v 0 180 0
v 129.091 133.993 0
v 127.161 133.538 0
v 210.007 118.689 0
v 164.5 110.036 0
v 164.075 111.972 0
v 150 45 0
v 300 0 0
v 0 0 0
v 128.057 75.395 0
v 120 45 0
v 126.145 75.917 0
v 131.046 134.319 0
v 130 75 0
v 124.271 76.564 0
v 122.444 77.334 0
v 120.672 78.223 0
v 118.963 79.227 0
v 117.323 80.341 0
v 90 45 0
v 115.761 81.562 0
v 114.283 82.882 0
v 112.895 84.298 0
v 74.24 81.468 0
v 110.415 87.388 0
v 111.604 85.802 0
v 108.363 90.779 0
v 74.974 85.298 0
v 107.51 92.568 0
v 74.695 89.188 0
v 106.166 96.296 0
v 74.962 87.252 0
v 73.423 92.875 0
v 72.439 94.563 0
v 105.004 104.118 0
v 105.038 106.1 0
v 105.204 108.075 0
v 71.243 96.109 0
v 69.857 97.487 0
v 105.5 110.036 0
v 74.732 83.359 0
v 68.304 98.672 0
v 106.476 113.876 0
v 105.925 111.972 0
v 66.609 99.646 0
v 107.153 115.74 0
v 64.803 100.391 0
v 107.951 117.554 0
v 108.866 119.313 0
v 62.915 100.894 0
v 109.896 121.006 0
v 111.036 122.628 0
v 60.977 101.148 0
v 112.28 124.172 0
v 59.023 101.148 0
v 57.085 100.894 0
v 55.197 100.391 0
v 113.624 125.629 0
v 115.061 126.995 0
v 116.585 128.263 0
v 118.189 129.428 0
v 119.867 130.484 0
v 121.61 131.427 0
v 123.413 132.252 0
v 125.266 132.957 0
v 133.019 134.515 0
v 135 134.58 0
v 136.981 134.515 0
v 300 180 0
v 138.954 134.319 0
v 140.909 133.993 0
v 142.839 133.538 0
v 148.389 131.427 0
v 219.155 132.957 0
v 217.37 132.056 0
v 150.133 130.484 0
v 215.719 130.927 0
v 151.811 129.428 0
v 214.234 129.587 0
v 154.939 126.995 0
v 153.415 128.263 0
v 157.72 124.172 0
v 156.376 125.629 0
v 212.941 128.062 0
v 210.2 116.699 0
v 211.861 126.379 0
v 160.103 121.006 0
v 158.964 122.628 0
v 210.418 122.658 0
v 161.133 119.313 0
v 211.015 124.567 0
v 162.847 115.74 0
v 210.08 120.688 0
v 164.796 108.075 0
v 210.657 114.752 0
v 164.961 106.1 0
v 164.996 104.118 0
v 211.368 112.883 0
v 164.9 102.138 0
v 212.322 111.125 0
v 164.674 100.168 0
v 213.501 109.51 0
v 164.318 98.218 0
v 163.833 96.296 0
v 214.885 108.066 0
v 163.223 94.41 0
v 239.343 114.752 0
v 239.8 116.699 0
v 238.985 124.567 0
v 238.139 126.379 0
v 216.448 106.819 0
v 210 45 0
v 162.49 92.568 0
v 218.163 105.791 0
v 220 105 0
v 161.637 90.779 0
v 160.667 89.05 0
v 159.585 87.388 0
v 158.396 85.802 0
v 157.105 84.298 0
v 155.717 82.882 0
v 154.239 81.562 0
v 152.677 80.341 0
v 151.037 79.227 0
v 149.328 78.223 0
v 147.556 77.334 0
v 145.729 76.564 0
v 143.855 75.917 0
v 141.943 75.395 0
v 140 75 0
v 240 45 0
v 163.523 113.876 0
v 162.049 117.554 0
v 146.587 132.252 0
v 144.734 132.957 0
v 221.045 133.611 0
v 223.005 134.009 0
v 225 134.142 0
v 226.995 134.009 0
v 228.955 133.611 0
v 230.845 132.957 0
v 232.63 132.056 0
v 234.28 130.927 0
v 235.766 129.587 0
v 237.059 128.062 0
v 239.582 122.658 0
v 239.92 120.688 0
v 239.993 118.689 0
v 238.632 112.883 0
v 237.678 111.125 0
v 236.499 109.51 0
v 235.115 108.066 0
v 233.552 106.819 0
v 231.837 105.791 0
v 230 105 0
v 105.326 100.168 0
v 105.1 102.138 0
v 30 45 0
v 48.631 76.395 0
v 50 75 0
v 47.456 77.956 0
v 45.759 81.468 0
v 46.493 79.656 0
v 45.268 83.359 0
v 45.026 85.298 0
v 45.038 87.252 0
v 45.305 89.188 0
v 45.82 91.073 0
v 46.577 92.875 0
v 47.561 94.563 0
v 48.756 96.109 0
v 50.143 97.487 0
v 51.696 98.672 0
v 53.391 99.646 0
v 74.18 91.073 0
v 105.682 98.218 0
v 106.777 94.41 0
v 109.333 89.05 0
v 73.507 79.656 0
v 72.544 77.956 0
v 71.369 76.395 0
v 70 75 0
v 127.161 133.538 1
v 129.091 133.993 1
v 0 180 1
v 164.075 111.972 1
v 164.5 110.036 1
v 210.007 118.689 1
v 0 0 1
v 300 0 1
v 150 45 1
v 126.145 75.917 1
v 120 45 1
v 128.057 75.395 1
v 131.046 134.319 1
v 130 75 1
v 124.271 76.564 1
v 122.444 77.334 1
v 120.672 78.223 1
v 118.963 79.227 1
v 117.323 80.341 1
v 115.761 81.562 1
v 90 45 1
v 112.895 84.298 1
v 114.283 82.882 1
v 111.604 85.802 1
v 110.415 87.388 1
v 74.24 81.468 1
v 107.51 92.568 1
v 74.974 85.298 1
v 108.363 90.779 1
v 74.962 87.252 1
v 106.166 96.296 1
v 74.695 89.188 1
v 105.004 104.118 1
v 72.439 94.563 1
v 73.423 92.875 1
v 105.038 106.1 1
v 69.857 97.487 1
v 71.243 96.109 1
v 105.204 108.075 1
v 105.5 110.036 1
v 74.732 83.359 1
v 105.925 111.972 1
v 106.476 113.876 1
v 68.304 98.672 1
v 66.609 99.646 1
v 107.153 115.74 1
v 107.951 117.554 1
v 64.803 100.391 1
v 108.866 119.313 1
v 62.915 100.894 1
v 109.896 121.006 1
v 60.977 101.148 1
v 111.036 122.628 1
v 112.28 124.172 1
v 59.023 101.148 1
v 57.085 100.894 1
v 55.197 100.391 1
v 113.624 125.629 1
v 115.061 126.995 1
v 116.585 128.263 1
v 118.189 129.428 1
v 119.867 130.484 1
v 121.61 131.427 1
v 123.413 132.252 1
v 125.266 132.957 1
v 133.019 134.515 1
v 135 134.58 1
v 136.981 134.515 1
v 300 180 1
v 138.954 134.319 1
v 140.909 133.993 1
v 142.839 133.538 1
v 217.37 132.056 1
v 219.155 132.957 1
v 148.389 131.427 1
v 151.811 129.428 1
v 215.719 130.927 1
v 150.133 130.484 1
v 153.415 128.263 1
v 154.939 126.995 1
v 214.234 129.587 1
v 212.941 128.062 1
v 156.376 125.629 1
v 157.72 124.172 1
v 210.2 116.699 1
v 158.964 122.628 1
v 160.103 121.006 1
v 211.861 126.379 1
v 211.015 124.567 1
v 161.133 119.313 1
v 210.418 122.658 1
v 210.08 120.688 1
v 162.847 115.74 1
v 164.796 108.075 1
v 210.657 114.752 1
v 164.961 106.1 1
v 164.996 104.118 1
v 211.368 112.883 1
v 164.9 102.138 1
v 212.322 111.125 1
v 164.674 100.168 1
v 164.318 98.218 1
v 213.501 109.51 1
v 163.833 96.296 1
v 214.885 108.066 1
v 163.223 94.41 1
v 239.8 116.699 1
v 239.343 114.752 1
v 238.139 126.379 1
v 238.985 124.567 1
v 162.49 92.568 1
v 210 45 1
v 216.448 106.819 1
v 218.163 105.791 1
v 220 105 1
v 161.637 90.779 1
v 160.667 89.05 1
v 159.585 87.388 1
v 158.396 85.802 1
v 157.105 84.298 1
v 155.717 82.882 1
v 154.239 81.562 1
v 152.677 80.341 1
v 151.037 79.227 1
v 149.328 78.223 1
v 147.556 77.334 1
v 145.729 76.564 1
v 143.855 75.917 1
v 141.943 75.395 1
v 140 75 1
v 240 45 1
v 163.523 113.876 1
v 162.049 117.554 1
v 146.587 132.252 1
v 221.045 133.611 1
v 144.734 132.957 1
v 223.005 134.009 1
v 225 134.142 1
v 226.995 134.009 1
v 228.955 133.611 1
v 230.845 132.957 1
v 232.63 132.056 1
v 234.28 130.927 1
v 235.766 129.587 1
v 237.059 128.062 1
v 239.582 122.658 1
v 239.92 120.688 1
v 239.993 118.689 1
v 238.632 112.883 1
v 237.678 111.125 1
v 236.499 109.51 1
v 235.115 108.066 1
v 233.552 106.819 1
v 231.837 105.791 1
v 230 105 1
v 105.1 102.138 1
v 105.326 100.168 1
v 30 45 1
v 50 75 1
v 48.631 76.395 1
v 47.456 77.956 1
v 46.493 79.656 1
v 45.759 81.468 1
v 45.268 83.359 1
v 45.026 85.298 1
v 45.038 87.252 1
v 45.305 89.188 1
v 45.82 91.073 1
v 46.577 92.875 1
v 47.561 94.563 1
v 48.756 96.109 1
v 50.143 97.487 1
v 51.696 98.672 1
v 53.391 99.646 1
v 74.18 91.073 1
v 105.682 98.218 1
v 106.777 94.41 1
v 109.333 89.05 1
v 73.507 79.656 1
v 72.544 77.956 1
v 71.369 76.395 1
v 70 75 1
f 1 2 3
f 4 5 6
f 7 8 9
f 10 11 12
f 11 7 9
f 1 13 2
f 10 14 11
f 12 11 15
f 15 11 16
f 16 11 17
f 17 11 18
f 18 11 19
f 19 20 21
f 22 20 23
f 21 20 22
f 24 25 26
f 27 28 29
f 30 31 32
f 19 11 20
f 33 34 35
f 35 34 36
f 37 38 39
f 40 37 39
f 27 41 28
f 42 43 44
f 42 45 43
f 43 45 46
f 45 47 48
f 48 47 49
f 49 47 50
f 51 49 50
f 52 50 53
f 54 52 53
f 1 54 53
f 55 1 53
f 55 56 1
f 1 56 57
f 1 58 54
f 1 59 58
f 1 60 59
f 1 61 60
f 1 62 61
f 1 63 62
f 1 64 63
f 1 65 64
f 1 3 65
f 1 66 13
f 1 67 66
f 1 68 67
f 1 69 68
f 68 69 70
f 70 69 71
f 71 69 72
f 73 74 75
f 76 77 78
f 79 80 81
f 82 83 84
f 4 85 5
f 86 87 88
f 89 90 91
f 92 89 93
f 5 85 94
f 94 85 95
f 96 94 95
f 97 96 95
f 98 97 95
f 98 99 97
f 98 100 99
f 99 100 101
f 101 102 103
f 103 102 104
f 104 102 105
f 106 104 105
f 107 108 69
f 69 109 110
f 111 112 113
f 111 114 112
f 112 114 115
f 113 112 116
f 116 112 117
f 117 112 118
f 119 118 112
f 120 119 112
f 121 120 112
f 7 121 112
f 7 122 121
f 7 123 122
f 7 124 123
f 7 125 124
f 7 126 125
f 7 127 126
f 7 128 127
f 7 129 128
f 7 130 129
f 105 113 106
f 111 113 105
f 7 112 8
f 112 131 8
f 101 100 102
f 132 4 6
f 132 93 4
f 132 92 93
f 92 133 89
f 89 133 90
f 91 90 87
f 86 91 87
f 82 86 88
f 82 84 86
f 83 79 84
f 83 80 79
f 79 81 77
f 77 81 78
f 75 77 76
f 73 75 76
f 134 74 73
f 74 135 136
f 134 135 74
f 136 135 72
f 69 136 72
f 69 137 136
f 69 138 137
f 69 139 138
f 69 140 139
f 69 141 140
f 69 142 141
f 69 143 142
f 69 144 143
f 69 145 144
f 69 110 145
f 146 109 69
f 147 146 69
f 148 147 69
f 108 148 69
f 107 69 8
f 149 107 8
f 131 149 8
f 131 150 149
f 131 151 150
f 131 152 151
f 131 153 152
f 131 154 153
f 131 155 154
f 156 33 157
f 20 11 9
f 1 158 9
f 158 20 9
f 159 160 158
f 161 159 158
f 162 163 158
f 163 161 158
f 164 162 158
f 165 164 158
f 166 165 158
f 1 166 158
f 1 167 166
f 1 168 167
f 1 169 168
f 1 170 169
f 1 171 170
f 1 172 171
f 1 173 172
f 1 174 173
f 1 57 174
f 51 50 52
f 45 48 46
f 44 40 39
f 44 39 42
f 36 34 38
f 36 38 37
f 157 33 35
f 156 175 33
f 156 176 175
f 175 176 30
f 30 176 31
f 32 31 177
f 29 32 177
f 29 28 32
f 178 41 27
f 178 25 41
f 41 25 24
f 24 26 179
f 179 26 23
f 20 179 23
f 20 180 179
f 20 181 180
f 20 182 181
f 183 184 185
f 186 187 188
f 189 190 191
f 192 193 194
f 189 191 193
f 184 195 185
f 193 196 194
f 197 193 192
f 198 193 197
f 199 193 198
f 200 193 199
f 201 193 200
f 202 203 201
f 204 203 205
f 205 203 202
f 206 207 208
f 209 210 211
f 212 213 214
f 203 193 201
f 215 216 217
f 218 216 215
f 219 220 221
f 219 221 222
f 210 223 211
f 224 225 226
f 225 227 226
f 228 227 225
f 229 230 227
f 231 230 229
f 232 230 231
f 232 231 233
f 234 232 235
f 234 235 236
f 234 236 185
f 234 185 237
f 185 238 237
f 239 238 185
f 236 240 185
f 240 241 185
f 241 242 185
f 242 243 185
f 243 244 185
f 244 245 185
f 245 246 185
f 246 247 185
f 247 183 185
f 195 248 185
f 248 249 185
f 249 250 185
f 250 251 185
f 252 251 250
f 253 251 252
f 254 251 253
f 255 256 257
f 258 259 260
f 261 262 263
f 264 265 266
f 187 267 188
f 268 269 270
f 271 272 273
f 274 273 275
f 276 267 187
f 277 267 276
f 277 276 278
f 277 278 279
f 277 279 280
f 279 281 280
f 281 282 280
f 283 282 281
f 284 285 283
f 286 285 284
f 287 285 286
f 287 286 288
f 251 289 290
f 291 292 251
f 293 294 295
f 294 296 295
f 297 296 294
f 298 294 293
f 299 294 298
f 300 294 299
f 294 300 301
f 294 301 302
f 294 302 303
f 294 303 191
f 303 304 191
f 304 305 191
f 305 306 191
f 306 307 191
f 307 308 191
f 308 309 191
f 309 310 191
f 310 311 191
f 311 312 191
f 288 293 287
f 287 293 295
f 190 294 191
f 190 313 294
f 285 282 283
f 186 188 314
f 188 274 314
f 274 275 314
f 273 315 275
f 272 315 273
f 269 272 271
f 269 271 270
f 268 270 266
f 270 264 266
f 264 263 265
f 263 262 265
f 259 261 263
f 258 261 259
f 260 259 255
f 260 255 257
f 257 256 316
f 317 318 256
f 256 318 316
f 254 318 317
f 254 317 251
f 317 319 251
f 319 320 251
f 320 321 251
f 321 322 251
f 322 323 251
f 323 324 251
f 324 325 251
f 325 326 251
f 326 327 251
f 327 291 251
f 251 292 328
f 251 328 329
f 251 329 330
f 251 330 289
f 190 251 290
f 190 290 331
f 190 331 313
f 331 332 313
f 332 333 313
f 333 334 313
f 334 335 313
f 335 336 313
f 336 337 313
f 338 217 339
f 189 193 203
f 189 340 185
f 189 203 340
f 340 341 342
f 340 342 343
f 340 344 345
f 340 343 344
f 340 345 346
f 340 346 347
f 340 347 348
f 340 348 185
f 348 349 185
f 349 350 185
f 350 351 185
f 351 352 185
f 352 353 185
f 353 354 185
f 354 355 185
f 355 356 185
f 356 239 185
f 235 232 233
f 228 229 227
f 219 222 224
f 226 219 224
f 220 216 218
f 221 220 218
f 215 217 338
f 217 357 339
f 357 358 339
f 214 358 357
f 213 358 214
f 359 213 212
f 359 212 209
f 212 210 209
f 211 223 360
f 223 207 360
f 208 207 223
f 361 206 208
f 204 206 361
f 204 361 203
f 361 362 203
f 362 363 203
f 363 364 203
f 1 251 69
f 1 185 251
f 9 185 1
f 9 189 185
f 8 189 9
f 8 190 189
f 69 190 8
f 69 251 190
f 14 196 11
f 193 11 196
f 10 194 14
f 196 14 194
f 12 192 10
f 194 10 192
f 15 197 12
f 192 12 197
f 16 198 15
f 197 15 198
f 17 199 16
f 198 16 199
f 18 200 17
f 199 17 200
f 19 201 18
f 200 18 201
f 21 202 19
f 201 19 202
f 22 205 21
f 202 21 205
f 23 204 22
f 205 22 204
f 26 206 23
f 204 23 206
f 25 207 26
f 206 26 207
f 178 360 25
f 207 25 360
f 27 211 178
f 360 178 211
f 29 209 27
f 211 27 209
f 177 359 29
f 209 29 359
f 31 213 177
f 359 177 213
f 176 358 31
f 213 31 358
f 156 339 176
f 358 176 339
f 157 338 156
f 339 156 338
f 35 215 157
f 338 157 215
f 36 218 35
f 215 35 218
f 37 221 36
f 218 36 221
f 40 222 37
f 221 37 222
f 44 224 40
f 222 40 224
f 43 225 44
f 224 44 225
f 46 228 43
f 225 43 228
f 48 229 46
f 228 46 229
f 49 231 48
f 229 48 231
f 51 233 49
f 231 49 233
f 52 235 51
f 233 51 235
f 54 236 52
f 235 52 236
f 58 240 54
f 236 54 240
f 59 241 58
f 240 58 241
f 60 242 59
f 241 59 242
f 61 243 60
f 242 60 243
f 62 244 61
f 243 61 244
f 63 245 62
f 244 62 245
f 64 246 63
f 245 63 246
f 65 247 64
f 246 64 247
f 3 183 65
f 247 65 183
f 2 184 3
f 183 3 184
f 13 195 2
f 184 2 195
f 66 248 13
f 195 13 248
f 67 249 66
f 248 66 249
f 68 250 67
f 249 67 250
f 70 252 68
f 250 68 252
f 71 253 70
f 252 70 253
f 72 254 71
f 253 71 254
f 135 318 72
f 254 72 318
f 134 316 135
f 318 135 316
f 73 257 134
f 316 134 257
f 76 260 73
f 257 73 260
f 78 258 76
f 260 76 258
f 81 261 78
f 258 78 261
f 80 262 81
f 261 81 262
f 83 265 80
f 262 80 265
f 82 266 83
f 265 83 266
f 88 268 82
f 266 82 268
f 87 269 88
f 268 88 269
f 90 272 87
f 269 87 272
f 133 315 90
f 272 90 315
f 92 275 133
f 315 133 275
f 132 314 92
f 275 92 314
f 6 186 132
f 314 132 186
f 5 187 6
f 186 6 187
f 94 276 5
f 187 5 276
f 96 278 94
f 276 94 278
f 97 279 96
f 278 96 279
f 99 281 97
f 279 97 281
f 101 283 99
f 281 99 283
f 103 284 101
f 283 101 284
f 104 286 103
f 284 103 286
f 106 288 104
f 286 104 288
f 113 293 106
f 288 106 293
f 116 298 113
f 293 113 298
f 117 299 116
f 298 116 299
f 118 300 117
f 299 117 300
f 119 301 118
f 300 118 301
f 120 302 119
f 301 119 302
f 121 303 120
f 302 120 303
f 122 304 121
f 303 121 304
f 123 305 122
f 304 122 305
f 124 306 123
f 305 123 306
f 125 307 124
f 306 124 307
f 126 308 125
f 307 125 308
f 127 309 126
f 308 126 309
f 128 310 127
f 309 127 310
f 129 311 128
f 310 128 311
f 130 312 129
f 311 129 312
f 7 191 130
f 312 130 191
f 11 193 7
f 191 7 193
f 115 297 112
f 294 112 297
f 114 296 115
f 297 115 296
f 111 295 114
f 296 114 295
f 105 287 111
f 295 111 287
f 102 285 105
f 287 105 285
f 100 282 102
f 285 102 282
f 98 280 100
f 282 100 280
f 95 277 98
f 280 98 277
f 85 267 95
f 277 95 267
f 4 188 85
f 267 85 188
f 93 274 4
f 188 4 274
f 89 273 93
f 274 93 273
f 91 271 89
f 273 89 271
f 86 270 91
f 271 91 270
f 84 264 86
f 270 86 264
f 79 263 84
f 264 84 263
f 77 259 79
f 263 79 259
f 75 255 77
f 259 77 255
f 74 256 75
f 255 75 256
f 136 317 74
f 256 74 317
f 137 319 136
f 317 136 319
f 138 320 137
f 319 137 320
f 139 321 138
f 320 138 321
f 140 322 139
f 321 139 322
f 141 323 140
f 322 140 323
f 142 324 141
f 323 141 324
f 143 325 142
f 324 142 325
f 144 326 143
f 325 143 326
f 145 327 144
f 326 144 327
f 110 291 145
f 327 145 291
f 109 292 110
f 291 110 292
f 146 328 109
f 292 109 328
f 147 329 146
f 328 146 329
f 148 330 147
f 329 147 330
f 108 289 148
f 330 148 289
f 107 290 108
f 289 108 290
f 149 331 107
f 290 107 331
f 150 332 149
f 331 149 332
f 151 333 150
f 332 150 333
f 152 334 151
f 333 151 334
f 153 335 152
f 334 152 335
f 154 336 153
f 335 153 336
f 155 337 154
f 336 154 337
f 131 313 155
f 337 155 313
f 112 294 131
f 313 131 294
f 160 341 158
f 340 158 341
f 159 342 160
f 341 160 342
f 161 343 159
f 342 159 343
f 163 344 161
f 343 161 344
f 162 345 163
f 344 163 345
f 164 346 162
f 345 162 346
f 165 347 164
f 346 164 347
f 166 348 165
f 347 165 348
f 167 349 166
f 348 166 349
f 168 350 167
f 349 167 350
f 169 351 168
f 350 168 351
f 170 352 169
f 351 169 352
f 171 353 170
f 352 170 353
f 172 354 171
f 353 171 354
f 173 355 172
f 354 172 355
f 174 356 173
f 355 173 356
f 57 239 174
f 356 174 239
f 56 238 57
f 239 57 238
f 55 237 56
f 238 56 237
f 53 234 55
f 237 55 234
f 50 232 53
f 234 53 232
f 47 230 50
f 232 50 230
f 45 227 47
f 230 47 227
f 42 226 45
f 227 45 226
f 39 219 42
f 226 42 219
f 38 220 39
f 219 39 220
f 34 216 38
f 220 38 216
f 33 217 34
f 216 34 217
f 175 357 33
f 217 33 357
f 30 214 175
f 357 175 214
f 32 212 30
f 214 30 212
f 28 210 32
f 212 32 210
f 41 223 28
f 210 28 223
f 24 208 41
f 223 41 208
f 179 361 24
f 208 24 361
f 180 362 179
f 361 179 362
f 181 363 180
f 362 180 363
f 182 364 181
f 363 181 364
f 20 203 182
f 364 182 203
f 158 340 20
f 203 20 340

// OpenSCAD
// Generated by Parametrix
ca_myPartP_face1_000 = [ [ 0.0000, 0.0000 ],[ 300.0000, 0.0000 ],[ 300.0000, 180.0000 ],[ 0.0000, 180.0000 ],[ 0.0000, 0.0000 ] ];
cb_myPartP_face1_000 = [  0, 1, 2, 3, 4 ];
ca_myPartP_face1_001 = [ [ 30.0000, 45.0000 ],[ 90.0000, 45.0000 ],[ 70.0000, 75.0000 ],[ 71.3686, 76.3949 ],[ 72.5443, 77.9559 ],[ 73.5070, 79.6565 ],[ 74.2405, 81.4678 ],[ 74.7323, 83.3590 ],[ 74.9740, 85.2982 ],[ 74.9616, 87.2524 ],[ 74.6953, 89.1883 ],[ 74.1796, 91.0732 ],[ 73.4231, 92.8751 ],[ 72.4389, 94.5633 ],[ 71.2435, 96.1092 ],[ 69.8574, 97.4866 ],[ 68.3039, 98.6722 ],[ 66.6094, 99.6457 ],[ 64.8028, 100.3907 ],[ 62.9147, 100.8944 ],[ 60.9771, 101.1485 ],[ 59.0229, 101.1485 ],[ 57.0853, 100.8944 ],[ 55.1972, 100.3907 ],[ 53.3906, 99.6457 ],[ 51.6961, 98.6722 ],[ 50.1426, 97.4866 ],[ 48.7565, 96.1092 ],[ 47.5611, 94.5633 ],[ 46.5769, 92.8751 ],[ 45.8204, 91.0732 ],[ 45.3047, 89.1883 ],[ 45.0384, 87.2524 ],[ 45.0260, 85.2982 ],[ 45.2677, 83.3590 ],[ 45.7595, 81.4678 ],[ 46.4930, 79.6565 ],[ 47.4557, 77.9559 ],[ 48.6314, 76.3949 ],[ 50.0000, 75.0000 ],[ 30.0000, 45.0000 ] ];
cb_myPartP_face1_001 = [  5, 6, 7, 8, 9, 10, 11, 12, 13, 14, 15, 16, 17, 18, 19, 20, 21, 22, 23, 24, 25, 26, 27, 28, 29, 30, 31, 32, 33, 34, 35, 36, 37, 38, 39, 40, 41, 42, 43, 44, 45 ];
ca_myPartP_face1_002 = [ [ 120.0000, 45.0000 ],[ 150.0000, 45.0000 ],[ 140.0000, 75.0000 ],[ 141.9427, 75.3948 ],[ 143.8551, 75.9170 ],[ 145.7288, 76.5645 ],[ 147.5556, 77.3342 ],[ 149.3277, 78.2229 ],[ 151.0371, 79.2267 ],[ 152.6766, 80.3412 ],[ 154.2389, 81.5616 ],[ 155.7171, 82.8824 ],[ 157.1049, 84.2980 ],[ 158.3962, 85.8022 ],[ 159.5853, 87.3884 ],[ 160.6670, 89.0496 ],[ 161.6367, 90.7787 ],[ 162.4901, 92.5680 ],[ 163.2234, 94.4098 ],[ 163.8335, 96.2960 ],[ 164.3176, 98.2184 ],[ 164.6738, 100.1685 ],[ 164.9004, 102.1379 ],[ 164.9964, 104.1180 ],[ 164.9615, 106.1001 ],[ 164.7957, 108.0755 ],[ 164.4998, 110.0357 ],[ 164.0751, 111.9721 ],[ 163.5235, 113.8762 ],[ 162.8473, 115.7397 ],[ 162.0494, 117.5545 ],[ 161.1335, 119.3126 ],[ 160.1035, 121.0064 ],[ 158.9638, 122.6285 ],[ 157.7196, 124.1718 ],[ 156.3761, 125.6295 ],[ 154.9392, 126.9953 ],[ 153.4153, 128.2632 ],[ 151.8110, 129.4277 ],[ 150.1333, 130.4837 ],[ 148.3895, 131.4267 ],[ 146.5872, 132.2523 ],[ 144.7344, 132.9572 ],[ 142.8390, 133.5381 ],[ 140.9094, 133.9926 ],[ 138.9540, 134.3187 ],[ 136.9813, 134.5149 ],[ 135.0000, 134.5804 ],[ 133.0187, 134.5149 ],[ 131.0460, 134.3187 ],[ 129.0906, 133.9926 ],[ 127.1610, 133.5381 ],[ 125.2656, 132.9572 ],[ 123.4128, 132.2523 ],[ 121.6105, 131.4267 ],[ 119.8667, 130.4837 ],[ 118.1890, 129.4277 ],[ 116.5847, 128.2632 ],[ 115.0608, 126.9953 ],[ 113.6239, 125.6295 ],[ 112.2804, 124.1718 ],[ 111.0362, 122.6285 ],[ 109.8965, 121.0064 ],[ 108.8665, 119.3126 ],[ 107.9506, 117.5545 ],[ 107.1527, 115.7397 ],[ 106.4765, 113.8762 ],[ 105.9249, 111.9721 ],[ 105.5002, 110.0357 ],[ 105.2043, 108.0755 ],[ 105.0385, 106.1001 ],[ 105.0036, 104.1180 ],[ 105.0996, 102.1379 ],[ 105.3262, 100.1685 ],[ 105.6824, 98.2184 ],[ 106.1665, 96.2960 ],[ 106.7766, 94.4098 ],[ 107.5099, 92.5680 ],[ 108.3633, 90.7787 ],[ 109.3330, 89.0496 ],[ 110.4147, 87.3884 ],[ 111.6038, 85.8022 ],[ 112.8951, 84.2980 ],[ 114.2829, 82.8824 ],[ 115.7611, 81.5616 ],[ 117.3234, 80.3412 ],[ 118.9629, 79.2267 ],[ 120.6723, 78.2229 ],[ 122.4444, 77.3342 ],[ 124.2712, 76.5645 ],[ 126.1449, 75.9170 ],[ 128.0573, 75.3948 ],[ 130.0000, 75.0000 ],[ 120.0000, 45.0000 ] ];
cb_myPartP_face1_002 = [  46, 47, 48, 49, 50, 51, 52, 53, 54, 55, 56, 57, 58, 59, 60, 61, 62, 63, 64, 65, 66, 67, 68, 69, 70, 71, 72, 73, 74, 75, 76, 77, 78, 79, 80, 81, 82, 83, 84, 85, 86, 87, 88, 89, 90, 91, 92, 93, 94, 95, 96, 97, 98, 99, 100, 101, 102, 103, 104, 105, 106, 107, 108, 109, 110, 111, 112, 113, 114, 115, 116, 117, 118, 119, 120, 121, 122, 123, 124, 125, 126, 127, 128, 129, 130, 131, 132, 133, 134, 135, 136, 137, 138, 139 ];
ca_myPartP_face1_003 = [ [ 210.0000, 45.0000 ],[ 240.0000, 45.0000 ],[ 230.0000, 105.0000 ],[ 231.8368, 105.7908 ],[ 233.5520, 106.8189 ],[ 235.1153, 108.0660 ],[ 236.4988, 109.5100 ],[ 237.6779, 111.1252 ],[ 238.6316, 112.8828 ],[ 239.3431, 114.7518 ],[ 239.7997, 116.6987 ],[ 239.9932, 118.6891 ],[ 239.9202, 120.6875 ],[ 239.5820, 122.6585 ],[ 238.9847, 124.5670 ],[ 238.1388, 126.3790 ],[ 237.0593, 128.0625 ],[ 235.7656, 129.5873 ],[ 234.2805, 130.9266 ],[ 232.6304, 132.0563 ],[ 230.8447, 132.9566 ],[ 228.9552, 133.6113 ],[ 226.9953, 134.0088 ],[ 225.0000, 134.1421 ],[ 223.0047, 134.0088 ],[ 221.0448, 133.6113 ],[ 219.1553, 132.9566 ],[ 217.3696, 132.0563 ],[ 215.7195, 130.9266 ],[ 214.2344, 129.5873 ],[ 212.9407, 128.0625 ],[ 211.8612, 126.3790 ],[ 211.0153, 124.5670 ],[ 210.4180, 122.6585 ],[ 210.0798, 120.6875 ],[ 210.0068, 118.6891 ],[ 210.2003, 116.6987 ],[ 210.6569, 114.7518 ],[ 211.3684, 112.8828 ],[ 212.3221, 111.1252 ],[ 213.5012, 109.5100 ],[ 214.8847, 108.0660 ],[ 216.4480, 106.8189 ],[ 218.1632, 105.7908 ],[ 220.0000, 105.0000 ],[ 210.0000, 45.0000 ] ];
cb_myPartP_face1_003 = [  140, 141, 142, 143, 144, 145, 146, 147, 148, 149, 150, 151, 152, 153, 154, 155, 156, 157, 158, 159, 160, 161, 162, 163, 164, 165, 166, 167, 168, 169, 170, 171, 172, 173, 174, 175, 176, 177, 178, 179, 180, 181, 182, 183, 184, 185 ];
a_myPartP_face1 = concat(ca_myPartP_face1_000, ca_myPartP_face1_001, ca_myPartP_face1_002, ca_myPartP_face1_003);
b_myPartP_face1 = [cb_myPartP_face1_000, cb_myPartP_face1_001, cb_myPartP_face1_002, cb_myPartP_face1_003];

module subpax_myPartP () {
	translate( [ 0, 0, 0 ])
		rotate( [ 0, 0, 0 ])
			   linear_extrude(height = 1) polygon(a_myPartP_face1, b_myPartP_face1);
}

module pax_myPartP () {
	subpax_myPartP();
}

pax_myPartP();
